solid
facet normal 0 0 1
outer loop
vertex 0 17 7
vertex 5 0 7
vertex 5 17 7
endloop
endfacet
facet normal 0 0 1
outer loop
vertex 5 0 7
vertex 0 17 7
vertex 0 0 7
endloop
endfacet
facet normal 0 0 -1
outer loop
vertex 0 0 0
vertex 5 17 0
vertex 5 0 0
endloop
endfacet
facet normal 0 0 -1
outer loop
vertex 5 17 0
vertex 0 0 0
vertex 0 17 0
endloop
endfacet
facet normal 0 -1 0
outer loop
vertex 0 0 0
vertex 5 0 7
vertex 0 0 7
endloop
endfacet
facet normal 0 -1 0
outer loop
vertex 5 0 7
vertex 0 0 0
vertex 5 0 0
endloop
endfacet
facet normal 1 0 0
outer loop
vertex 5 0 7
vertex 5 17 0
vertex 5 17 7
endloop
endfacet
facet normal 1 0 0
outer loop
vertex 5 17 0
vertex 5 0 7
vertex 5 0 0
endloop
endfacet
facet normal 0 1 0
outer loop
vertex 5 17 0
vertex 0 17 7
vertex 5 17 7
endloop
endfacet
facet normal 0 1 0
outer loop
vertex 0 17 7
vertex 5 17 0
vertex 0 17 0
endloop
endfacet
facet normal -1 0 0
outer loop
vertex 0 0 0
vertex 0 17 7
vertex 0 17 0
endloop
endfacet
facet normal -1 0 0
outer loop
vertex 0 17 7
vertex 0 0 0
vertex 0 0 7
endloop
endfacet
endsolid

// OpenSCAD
// Generated by SolidPython 1.0.1 on 2020-07-29 00:46:54


cube(size = [5, 17, 7]);
/***********************************************
*********      SolidPython code:      **********
************************************************
 
# import packages: SolidPython
from solid import *
from solid.utils import *
from itertools import chain, combinations, permutations


class Resize:

    def __init__(self, scad_file):
        self.scad_file = scad_file
        #self.scad_file = import_scad(scad_file)
        # cone/cylinder param:
        self.r1 = 0
        self.r2 = 0
        self.h = 0
        # rectangular prism param:
        self.w = 0
        self.l = 0
        # ellipse param:
        self.r = 0

    # import OpenScad code (file name corresponds to shape)


    # classify shape + parameters
    def assign(self, param1, param2, param3):
        if self.scad_file == 'cone.scad':
            self.r1 = param1
            self.r2 = param2
            self.h = param3
        elif self.scad_file == 'cylinder.scad':
            self.r1 = param1
            self.r2 = param2
            self.h = param3
        elif self.scad_file == 'rectangularPrism.scad':
            self.h = param1
            self.l = param2
            self.w = param3
        else:
            self.r = param1
            self.h = param2

    # resize parameters
    def iterate(self):
        x = range(3, 20, 2)
        i = 1
        if self.scad_file == 'cone.scad':
            tempList = list(permutations(x, 2))
            for temp in tempList:
                param1 = temp[0]
                param2 = temp[1]
                filepath = 'produced_scad_files/' + 'cone' + str(param1) + '_' + str(param2) + '_' + '.scad'
                scad_render_to_file(cylinder(h=param1, r1=param2, r2=0), filepath)

        elif self.scad_file == 'cylinder.scad':
            tempList = list(permutations(x, 3))
            for temp in tempList:
                param1 = temp[0]
                param2 = temp[1]
                filepath = 'produced_scad_files/' + 'cylinder' + str(param1) + '_' + str(param2) + '_' + '.scad'
                scad_render_to_file(cylinder(h=param1, r1=param2, r2=param2), filepath)

        elif self.scad_file == 'rectangularPrism.scad':
            tempList = list(permutations(x, 3))
            for temp in tempList:
                param1 = temp[0]
                param2 = temp[1]
                param3 = temp[2]
                filepath = 'produced_scad_files/' + 'rectangularPrism' + str(param1) + '_' + str(param2) + '_' + str(
                    param3) + '.scad'
                scad_render_to_file(cube(size=(param1, param2, param3)), filepath)

        elif self.scad_file == 'ellipse.scad':
            tempList = list(permutations(x, 4))
            for temp in tempList:
                param1 = temp[0]
                param2 = temp[1]
                param3 = temp[2]
                param4 = temp[3]
                filepath = 'produced_scad_files/' + 'ellipse' + str(param1) + '_' + str(param2) + '_' + str(param3) + '_' + str(param4) + '.scad'
                scad_render_to_file(scale([param1, param2, param3])(sphere(r=param4)), filepath)

    def render_to_scadfile(self):
        scad_render_to_file(scad, 'example.scad') 
 
************************************************/
